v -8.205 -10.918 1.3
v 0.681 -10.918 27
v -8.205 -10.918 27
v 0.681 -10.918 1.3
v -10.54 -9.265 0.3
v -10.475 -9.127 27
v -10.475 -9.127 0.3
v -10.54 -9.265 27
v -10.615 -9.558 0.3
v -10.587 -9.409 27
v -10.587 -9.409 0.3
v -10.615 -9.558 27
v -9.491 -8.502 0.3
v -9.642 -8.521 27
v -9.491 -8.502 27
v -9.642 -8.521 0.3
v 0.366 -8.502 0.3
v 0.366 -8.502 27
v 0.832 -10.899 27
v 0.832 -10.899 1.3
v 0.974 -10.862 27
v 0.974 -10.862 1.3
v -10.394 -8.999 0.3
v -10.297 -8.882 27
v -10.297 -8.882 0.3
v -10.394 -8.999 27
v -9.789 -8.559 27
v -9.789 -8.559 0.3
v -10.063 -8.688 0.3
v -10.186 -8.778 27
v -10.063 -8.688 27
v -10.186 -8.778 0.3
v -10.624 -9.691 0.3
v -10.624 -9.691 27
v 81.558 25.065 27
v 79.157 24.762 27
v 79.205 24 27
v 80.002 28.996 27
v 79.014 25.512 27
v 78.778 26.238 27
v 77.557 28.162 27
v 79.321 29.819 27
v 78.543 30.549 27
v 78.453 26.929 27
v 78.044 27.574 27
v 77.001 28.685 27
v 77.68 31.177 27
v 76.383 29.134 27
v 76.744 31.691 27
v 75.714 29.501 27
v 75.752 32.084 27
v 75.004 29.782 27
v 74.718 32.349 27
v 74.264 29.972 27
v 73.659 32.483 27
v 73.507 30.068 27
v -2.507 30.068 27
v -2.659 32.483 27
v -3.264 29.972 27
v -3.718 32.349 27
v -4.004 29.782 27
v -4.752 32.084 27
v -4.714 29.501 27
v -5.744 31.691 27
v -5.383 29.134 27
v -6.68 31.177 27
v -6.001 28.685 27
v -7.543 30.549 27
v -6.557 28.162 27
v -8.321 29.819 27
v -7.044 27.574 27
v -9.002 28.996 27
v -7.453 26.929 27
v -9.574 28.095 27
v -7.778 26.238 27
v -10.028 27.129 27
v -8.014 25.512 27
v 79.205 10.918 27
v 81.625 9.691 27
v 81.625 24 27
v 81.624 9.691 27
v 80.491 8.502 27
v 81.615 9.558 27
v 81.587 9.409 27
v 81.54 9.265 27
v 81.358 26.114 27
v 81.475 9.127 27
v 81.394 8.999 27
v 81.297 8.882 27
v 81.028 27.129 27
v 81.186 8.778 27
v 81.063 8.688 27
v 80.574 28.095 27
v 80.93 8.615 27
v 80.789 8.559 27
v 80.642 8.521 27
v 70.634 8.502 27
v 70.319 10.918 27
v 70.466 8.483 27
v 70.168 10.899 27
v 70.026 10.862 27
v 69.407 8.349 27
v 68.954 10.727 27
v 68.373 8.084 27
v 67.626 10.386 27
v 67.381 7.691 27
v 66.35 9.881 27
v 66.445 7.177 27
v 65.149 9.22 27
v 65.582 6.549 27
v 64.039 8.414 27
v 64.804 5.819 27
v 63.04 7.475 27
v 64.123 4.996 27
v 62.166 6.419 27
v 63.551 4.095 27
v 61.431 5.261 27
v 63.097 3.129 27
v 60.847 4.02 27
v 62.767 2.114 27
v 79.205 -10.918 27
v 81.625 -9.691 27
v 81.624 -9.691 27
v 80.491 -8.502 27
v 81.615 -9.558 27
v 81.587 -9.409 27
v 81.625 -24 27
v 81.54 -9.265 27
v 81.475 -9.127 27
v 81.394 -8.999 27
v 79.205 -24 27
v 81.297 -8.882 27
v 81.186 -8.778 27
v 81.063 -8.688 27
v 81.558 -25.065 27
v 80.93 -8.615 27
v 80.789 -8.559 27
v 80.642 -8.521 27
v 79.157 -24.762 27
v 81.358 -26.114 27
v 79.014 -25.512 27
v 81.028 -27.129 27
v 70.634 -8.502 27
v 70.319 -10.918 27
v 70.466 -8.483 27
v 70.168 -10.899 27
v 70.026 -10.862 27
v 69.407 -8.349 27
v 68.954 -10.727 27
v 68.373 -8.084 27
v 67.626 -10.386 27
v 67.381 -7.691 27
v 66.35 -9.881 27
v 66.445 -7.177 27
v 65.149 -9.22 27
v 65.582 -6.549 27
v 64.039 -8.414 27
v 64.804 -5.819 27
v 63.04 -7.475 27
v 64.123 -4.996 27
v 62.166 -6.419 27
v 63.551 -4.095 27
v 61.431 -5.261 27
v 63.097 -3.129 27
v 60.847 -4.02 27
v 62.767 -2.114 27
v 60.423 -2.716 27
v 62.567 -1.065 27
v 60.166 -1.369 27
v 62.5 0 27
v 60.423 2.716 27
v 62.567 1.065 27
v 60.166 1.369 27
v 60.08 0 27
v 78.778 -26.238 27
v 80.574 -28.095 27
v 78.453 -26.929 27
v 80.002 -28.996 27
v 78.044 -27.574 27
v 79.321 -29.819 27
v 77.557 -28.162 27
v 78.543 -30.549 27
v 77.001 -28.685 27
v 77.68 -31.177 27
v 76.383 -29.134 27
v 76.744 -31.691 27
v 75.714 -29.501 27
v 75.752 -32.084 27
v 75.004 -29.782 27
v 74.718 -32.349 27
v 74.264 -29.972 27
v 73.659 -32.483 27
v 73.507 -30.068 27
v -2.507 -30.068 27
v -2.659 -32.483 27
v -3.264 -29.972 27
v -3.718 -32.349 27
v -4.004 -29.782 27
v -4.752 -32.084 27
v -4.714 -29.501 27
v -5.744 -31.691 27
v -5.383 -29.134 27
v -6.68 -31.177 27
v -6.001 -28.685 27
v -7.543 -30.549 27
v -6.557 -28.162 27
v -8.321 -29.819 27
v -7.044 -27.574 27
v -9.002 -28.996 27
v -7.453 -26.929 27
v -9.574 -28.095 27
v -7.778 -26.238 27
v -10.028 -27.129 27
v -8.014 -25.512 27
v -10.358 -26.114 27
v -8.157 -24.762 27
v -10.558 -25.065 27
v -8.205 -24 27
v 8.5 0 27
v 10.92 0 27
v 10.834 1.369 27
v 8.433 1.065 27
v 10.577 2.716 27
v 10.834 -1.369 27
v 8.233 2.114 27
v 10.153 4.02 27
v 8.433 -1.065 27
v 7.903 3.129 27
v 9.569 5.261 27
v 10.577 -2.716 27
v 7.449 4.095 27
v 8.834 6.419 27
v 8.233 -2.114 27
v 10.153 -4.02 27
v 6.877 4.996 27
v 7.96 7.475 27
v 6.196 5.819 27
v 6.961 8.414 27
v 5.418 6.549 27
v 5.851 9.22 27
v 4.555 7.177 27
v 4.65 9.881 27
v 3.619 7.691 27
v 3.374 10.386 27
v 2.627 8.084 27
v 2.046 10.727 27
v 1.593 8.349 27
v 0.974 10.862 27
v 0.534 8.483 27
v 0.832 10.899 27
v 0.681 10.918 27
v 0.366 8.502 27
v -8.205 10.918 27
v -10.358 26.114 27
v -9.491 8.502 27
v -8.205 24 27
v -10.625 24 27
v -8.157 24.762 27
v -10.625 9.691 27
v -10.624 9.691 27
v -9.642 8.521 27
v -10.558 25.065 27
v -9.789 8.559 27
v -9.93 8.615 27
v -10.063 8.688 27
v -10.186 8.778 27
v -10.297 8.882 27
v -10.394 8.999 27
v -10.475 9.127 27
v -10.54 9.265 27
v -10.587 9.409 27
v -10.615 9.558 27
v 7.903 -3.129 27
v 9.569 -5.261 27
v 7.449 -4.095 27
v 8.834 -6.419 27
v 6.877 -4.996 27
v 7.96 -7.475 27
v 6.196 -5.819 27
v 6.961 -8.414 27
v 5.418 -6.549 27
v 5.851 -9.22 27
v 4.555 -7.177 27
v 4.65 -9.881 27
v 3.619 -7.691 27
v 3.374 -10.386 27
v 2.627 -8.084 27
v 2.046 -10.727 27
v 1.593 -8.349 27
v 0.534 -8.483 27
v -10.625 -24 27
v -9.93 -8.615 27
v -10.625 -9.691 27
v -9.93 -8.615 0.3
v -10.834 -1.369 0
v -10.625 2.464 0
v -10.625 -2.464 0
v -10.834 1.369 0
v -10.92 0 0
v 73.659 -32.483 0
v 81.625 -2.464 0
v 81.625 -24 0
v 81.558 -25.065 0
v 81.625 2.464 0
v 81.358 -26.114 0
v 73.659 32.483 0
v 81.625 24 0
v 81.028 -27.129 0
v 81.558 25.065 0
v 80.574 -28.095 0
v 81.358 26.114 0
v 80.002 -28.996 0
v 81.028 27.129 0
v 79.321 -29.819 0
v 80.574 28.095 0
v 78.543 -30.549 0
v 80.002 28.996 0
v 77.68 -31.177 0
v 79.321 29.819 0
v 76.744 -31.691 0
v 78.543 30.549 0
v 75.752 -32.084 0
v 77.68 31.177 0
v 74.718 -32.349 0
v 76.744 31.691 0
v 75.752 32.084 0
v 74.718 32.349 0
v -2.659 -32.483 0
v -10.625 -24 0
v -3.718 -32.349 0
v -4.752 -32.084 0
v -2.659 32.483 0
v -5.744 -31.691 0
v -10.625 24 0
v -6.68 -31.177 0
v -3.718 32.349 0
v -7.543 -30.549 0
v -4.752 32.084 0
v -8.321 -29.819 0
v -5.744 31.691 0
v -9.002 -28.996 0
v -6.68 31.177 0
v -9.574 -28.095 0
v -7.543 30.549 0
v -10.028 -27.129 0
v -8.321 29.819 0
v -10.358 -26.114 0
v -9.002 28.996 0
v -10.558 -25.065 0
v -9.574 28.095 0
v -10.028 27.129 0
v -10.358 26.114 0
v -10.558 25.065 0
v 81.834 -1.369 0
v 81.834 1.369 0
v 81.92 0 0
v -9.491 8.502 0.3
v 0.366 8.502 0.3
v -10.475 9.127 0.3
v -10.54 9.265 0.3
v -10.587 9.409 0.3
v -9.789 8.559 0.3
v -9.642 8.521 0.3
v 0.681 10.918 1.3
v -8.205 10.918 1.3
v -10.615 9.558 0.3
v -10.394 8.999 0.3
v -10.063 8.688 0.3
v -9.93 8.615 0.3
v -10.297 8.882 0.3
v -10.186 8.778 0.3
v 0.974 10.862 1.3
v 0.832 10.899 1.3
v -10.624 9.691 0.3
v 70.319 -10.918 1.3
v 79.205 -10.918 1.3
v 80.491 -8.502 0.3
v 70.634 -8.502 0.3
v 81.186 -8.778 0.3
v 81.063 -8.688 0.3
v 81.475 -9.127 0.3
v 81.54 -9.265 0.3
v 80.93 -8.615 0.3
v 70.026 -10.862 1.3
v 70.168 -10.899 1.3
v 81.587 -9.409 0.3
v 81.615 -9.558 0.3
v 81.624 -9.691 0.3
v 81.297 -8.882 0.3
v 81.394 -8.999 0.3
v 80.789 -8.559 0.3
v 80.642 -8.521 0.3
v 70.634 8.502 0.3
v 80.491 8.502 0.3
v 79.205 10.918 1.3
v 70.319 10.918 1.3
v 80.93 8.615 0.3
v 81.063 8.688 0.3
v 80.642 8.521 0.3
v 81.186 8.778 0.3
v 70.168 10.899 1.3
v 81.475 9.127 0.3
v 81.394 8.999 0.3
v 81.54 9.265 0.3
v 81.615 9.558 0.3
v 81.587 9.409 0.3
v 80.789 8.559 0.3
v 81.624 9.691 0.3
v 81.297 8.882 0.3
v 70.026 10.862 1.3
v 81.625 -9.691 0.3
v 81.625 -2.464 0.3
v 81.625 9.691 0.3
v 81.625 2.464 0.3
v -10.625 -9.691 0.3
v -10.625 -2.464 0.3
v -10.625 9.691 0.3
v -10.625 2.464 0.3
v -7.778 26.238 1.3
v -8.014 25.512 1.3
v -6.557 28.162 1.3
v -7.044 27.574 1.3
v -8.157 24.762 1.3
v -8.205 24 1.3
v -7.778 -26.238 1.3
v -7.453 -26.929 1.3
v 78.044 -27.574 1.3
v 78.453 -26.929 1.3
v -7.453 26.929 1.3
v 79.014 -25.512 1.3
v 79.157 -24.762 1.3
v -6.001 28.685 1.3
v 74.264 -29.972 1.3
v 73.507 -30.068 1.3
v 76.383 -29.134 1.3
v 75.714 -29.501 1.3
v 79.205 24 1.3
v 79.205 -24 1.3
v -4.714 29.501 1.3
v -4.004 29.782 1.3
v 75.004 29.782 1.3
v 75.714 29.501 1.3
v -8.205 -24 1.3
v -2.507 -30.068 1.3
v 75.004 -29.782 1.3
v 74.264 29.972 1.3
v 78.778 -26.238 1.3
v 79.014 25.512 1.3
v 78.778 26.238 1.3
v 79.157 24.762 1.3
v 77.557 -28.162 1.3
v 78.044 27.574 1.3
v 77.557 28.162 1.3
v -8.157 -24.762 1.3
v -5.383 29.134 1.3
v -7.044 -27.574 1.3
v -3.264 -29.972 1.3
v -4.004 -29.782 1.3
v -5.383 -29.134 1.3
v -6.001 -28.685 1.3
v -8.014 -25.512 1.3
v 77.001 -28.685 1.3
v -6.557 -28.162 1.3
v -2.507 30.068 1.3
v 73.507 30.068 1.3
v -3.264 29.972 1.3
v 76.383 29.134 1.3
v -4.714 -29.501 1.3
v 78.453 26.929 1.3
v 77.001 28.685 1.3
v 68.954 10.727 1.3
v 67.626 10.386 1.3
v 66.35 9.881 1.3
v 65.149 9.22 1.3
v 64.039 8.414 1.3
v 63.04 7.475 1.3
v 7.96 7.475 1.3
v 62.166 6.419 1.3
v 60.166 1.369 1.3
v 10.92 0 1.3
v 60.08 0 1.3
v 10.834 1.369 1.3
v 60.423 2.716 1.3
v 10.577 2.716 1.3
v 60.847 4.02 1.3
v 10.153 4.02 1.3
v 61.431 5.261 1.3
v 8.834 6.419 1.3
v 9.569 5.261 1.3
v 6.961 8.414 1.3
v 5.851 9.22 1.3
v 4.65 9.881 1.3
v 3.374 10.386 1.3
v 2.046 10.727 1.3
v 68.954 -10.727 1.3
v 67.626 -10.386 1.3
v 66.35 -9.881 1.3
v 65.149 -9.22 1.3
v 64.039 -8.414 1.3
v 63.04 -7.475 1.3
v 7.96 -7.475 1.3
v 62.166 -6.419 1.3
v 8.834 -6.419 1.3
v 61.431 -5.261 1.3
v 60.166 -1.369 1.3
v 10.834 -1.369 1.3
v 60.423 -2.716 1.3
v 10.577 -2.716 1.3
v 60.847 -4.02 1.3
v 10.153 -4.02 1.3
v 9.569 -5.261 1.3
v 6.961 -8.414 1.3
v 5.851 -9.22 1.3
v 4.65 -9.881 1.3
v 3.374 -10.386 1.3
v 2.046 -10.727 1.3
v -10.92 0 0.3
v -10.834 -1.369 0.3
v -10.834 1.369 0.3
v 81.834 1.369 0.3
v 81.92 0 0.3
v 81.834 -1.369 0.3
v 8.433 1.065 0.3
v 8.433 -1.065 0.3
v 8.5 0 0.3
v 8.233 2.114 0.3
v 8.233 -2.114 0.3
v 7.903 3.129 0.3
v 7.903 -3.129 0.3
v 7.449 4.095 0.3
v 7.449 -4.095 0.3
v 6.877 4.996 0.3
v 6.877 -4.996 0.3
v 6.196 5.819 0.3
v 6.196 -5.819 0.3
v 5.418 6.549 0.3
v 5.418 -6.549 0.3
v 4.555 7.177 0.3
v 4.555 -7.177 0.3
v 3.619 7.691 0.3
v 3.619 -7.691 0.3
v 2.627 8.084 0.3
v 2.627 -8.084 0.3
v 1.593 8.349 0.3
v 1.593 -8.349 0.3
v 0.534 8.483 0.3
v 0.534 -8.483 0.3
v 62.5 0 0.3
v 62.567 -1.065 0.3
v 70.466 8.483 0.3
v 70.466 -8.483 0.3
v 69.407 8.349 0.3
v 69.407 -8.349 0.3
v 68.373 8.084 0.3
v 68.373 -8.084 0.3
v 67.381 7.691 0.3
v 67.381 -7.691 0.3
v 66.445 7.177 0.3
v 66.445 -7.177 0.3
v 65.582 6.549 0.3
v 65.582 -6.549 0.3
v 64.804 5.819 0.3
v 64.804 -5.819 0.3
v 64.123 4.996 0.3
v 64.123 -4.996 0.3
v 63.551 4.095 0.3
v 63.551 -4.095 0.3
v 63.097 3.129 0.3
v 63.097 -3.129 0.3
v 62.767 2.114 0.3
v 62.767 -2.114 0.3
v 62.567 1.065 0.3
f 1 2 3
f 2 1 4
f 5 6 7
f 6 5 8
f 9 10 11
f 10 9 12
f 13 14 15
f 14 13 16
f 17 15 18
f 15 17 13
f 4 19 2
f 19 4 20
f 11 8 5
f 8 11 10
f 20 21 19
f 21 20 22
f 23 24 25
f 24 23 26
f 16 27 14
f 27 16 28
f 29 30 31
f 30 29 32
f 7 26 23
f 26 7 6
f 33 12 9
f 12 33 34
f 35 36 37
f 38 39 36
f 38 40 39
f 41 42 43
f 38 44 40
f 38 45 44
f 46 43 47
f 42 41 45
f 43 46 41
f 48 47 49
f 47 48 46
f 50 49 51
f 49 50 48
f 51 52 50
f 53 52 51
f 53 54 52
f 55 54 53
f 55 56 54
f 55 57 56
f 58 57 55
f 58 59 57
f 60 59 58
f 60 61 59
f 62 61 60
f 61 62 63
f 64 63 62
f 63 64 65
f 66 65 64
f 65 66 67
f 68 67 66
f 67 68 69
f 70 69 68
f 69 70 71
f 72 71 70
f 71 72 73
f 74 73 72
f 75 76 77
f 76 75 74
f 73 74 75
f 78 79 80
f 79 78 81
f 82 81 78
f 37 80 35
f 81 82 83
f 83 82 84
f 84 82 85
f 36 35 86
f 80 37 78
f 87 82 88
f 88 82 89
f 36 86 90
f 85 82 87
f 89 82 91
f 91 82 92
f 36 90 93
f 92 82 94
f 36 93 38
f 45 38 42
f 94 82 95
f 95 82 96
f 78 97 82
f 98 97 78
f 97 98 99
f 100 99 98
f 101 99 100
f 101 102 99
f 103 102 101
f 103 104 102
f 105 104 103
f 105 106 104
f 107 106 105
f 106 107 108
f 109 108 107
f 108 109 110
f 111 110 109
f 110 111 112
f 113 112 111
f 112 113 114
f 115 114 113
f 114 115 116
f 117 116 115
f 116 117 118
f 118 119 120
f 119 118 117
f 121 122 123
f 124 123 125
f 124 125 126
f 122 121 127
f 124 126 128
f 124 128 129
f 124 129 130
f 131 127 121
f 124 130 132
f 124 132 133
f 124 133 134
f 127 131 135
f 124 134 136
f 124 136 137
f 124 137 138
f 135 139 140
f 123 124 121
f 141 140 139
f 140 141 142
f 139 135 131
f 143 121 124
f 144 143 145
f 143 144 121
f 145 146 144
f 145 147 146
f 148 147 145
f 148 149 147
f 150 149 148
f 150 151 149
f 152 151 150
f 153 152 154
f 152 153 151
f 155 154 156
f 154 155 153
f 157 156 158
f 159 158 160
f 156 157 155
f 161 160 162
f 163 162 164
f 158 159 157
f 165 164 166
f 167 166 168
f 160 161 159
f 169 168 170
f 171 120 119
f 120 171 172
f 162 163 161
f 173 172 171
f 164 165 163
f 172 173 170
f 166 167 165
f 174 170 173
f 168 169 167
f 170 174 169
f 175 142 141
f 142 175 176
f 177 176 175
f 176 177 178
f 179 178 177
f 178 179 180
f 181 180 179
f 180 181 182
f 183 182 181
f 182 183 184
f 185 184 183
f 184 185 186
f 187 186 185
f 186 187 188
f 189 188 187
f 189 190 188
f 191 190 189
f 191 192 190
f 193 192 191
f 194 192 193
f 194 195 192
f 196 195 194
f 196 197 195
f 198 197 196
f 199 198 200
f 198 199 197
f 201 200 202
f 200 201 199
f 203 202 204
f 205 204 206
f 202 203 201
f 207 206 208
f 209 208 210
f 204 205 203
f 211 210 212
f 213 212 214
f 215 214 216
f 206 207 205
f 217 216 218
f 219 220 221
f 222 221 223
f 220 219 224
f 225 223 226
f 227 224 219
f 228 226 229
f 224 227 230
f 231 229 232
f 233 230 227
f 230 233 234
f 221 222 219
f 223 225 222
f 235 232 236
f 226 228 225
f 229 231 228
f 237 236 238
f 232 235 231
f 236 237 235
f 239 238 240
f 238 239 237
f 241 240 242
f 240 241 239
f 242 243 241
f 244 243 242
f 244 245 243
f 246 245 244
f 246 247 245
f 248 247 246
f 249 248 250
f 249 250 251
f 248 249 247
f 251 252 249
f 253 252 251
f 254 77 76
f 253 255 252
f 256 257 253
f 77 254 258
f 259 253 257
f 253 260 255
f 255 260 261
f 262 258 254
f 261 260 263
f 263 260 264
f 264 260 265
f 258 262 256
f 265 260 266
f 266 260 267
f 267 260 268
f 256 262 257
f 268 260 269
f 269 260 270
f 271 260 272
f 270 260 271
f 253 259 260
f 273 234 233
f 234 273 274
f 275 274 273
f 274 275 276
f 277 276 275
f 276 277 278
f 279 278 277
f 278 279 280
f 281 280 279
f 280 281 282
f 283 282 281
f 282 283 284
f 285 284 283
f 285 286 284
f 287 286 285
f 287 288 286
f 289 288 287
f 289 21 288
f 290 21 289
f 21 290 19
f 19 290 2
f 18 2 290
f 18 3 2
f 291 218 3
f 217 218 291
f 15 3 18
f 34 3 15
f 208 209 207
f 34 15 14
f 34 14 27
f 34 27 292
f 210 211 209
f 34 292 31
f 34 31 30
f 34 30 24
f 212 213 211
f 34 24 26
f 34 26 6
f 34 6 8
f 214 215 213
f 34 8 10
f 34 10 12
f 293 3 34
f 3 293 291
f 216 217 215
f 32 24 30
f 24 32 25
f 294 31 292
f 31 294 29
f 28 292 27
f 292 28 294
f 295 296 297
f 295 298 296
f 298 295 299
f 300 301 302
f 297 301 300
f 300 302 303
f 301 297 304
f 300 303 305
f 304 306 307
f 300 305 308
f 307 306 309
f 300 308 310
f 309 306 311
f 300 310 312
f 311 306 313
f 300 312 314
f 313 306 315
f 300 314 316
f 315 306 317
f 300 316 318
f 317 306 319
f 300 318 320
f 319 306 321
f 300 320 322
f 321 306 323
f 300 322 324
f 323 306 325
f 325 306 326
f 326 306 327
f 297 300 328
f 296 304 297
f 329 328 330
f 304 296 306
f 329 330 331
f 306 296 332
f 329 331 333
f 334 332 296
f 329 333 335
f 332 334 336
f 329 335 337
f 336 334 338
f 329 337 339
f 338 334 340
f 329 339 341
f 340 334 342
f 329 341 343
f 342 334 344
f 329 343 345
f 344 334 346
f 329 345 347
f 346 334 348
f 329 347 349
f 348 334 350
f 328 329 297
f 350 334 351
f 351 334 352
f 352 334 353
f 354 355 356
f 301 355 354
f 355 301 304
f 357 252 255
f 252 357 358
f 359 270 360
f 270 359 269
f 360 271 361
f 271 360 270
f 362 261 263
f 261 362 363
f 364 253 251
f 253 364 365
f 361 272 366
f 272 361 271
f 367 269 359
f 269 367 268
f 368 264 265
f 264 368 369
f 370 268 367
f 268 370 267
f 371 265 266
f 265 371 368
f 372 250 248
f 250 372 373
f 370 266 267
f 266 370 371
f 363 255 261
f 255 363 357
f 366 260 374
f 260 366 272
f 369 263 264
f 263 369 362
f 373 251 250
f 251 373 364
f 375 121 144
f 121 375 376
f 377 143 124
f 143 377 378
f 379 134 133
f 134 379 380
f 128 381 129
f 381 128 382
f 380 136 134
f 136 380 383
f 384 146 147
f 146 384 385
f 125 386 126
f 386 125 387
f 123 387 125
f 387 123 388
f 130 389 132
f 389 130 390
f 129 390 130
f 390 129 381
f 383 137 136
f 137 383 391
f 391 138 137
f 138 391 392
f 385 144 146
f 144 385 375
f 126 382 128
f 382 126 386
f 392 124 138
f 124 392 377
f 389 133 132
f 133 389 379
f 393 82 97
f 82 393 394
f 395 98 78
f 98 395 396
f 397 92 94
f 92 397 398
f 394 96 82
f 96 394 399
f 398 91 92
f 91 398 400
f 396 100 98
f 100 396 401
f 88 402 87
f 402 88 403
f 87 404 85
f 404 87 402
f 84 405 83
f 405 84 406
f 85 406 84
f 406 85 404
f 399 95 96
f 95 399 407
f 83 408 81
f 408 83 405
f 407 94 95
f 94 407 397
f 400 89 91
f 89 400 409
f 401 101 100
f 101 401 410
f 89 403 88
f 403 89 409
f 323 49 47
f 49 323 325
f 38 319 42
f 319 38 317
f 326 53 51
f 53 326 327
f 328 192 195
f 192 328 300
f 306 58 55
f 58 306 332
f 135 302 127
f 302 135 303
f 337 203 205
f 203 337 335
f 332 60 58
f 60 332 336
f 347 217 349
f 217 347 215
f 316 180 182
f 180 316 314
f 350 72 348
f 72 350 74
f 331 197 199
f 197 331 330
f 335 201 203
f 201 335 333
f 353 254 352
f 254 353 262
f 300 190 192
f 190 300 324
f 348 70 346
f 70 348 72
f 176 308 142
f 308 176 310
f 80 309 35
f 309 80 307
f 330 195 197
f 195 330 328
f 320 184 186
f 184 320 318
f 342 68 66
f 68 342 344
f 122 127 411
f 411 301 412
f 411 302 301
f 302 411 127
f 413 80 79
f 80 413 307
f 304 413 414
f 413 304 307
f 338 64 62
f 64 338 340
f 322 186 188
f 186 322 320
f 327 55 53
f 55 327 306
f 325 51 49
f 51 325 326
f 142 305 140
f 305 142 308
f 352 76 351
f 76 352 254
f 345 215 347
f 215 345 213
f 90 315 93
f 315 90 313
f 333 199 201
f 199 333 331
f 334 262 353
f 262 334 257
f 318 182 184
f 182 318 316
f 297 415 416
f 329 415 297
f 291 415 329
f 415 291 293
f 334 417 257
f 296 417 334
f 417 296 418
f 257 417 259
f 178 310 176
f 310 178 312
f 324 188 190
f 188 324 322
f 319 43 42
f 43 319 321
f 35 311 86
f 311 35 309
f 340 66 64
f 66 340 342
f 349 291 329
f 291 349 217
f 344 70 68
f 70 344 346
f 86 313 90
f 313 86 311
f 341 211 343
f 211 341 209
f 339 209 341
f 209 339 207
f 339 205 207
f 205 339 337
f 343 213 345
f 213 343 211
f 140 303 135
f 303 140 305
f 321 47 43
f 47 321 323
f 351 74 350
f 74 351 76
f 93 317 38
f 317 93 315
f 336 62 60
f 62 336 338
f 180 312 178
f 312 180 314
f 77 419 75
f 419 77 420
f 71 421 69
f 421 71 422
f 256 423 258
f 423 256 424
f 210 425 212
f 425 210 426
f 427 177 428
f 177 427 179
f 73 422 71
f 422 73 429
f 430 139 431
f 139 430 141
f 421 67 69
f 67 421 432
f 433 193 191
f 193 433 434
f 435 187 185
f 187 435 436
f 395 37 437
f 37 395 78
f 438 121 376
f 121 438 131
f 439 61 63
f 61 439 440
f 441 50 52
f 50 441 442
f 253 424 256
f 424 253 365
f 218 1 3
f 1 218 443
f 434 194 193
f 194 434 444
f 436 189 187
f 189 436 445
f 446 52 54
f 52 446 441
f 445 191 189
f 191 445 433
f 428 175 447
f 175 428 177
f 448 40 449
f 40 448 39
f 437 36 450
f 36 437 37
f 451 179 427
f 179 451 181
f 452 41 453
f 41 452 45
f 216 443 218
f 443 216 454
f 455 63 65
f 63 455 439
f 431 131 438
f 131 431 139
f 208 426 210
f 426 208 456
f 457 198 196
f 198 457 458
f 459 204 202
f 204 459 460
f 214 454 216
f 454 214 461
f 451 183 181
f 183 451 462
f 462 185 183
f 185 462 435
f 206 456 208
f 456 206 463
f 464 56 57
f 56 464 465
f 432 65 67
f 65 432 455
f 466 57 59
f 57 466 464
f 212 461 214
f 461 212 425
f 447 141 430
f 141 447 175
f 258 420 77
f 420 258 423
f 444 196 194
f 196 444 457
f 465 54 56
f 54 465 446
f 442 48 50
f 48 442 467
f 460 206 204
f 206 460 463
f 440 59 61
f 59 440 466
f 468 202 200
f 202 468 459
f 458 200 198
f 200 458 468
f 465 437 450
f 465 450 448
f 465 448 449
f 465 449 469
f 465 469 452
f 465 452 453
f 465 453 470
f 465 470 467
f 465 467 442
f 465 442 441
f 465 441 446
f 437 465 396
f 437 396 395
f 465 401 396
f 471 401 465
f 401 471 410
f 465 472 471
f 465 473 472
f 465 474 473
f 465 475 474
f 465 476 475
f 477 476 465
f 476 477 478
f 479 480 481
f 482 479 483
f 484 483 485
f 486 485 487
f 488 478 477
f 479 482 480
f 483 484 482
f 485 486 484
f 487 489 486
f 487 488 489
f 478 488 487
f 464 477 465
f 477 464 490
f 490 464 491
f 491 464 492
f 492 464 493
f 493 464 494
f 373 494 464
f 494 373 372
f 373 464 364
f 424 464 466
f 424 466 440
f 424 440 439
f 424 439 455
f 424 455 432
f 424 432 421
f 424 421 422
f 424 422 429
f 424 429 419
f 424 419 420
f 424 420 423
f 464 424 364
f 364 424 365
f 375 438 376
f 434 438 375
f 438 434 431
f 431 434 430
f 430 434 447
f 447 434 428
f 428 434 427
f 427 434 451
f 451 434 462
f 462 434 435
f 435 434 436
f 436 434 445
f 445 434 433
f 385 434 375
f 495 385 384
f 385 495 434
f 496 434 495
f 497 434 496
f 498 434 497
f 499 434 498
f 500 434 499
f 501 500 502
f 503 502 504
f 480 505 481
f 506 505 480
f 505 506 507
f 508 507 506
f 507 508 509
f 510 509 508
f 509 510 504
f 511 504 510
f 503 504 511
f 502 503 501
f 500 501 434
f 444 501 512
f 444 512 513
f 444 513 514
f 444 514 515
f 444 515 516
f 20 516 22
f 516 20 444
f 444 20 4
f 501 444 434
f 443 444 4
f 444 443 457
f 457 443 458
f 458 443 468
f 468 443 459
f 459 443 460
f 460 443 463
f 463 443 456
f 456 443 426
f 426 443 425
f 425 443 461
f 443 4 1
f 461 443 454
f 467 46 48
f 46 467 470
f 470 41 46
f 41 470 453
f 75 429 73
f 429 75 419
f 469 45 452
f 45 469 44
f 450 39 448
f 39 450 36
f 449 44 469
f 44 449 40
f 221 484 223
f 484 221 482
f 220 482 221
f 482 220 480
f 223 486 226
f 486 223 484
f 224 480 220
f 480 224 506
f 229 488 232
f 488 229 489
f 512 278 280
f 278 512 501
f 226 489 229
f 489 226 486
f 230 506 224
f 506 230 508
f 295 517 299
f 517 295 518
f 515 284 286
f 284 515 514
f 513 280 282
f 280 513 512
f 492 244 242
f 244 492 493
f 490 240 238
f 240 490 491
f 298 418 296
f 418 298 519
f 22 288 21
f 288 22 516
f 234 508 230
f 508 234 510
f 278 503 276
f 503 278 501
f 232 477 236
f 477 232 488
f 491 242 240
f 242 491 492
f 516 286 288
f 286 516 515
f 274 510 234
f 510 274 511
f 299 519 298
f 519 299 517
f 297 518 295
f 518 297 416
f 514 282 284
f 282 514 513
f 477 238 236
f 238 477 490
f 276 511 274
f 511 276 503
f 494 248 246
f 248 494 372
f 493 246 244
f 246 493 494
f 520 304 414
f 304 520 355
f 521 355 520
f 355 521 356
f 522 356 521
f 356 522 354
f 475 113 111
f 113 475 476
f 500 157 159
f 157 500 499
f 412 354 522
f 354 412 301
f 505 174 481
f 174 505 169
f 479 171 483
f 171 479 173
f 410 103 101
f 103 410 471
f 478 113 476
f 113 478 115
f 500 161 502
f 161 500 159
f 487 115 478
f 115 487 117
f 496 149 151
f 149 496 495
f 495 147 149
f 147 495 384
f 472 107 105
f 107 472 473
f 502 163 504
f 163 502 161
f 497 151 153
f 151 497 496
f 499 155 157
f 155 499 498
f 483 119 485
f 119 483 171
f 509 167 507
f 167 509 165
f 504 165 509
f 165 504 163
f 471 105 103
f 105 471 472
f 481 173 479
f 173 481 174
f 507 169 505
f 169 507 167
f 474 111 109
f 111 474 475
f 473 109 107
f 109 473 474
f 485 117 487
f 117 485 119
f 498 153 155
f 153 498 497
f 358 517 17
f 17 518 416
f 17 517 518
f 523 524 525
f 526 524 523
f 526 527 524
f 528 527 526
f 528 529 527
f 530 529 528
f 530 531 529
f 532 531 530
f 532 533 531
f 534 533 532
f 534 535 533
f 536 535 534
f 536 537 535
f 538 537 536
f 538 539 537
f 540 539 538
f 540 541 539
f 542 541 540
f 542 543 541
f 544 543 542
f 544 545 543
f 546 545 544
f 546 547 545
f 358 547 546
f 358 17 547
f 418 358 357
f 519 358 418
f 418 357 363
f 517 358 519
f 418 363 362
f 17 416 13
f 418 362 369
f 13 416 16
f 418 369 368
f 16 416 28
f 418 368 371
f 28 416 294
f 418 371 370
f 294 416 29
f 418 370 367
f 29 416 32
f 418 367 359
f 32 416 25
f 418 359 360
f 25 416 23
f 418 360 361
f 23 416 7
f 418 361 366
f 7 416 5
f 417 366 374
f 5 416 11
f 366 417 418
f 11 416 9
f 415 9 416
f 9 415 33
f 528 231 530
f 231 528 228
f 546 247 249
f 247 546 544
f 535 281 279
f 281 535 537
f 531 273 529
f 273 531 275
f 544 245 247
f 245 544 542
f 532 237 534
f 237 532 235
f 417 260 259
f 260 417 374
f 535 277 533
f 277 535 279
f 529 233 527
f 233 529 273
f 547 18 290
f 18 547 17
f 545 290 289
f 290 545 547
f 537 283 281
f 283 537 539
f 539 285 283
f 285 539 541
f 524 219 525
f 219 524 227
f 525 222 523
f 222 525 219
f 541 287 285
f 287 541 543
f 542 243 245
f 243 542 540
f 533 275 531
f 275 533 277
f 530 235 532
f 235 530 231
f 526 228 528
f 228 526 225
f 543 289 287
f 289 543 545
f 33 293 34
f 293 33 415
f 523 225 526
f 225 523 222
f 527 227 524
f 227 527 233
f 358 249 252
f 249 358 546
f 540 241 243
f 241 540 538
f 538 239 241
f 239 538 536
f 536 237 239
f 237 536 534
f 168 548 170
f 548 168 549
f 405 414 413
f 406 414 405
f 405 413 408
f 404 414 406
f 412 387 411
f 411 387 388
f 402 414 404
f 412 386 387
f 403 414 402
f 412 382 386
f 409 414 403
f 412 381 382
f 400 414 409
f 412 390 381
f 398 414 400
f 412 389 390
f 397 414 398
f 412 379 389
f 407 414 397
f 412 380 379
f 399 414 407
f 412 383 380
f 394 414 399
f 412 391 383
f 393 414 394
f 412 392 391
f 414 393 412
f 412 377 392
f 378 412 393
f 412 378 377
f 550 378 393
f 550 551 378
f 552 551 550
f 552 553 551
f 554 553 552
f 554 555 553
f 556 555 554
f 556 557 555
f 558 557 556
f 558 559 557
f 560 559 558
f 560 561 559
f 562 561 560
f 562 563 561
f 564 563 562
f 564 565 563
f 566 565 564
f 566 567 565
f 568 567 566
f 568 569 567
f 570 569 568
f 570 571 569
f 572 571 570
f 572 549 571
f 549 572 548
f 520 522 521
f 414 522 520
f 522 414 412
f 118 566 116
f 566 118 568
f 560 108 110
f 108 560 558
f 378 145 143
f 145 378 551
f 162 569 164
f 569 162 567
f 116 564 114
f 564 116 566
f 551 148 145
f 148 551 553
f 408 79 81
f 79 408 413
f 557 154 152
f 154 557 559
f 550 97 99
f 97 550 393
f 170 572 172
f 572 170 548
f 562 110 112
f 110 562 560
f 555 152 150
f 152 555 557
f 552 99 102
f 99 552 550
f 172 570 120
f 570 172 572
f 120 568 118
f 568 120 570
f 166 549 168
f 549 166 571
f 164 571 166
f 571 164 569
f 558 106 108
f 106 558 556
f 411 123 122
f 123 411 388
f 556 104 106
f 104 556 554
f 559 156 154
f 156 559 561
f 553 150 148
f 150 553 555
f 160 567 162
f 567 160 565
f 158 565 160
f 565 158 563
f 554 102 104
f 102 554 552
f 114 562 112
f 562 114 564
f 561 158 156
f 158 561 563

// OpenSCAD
// Written by Remi Vansnickt <>
//Feel free to tip me : https://www.thingiverse.com/Remivans/about
//Thingiverse : https://www.thingiverse.com/thing:3273050
//Licensed under the Creative Commons - Attribution - Non-Commercial - Share Alike license.

/* [Children bed parameter] */

//(mm)bar diameter
barDiameter=17;//[5:0.1:50]

//(mm) space beetween inner bar
barSpace=54;//[10:0.1:200]

//(mm) Height of output part ( barSpace/2 for uniforme top )
partHeight=27;//[5:0.5:200]

//(mm) Width of output part
partWidth=65;//[5:0.5:200]

//(mm) Height of bottom
floorHeight=1.3;//[0.3:0.1:5]

//(mm) Do you need space beetween part and bar
clearance=0;//[-2:0.1:2]

/* [Printer setting] */
//(mm) Height of first layer ( for removable brim inside hole)
PrinterFirstLayerHeight=0.3;//[0.1:0.01:0.5]

//(mm) Width of your Printer nozzle
PrinterNozzleWidth=0.4;//[0.1:0.05:1]

// number of wall
PartNumberWall=6;//[3:1:20]

cylinderPath=barSpace+barDiameter;
rPath=PrinterNozzleWidth*PartNumberWall/2+0.01;

//output
helper();
output();


//module
module barreau(clearance=0,cut=0){
	translate([0,0,-cut])cylinder(r=barDiameter/2+clearance,h=barSpace/2+2*cut,$fn=50);
	}

module helper(){
	$fn=50;
	hull(){
		translate([-barDiameter/8-barDiameter/2+rPath,-barDiameter/2-rPath-clearance,0])cylinder(r=rPath,h=partHeight);
		translate([+rPath/2,-barDiameter/2-rPath-+clearance,0])cylinder(r=rPath,h=partHeight);
		}
	hull(){
		translate([-barDiameter/8-barDiameter/2+rPath,+barDiameter/2+rPath+clearance,0])cylinder(r=rPath,h=partHeight);
		translate([+rPath/2,+barDiameter/2+rPath+clearance,0])cylinder(r=rPath,h=partHeight);
		}
		
			hull(){
		translate([cylinderPath+barDiameter/8+barDiameter/2-rPath,-barDiameter/2-rPath-+clearance,0])cylinder(r=rPath,h=partHeight);
		translate([-rPath/2+cylinderPath,-barDiameter/2-rPath-+clearance,0])cylinder(r=rPath,h=partHeight);
		}
	hull(){
		translate([cylinderPath+barDiameter/8+barDiameter/2-rPath,+barDiameter/2+rPath+clearance,0])cylinder(r=rPath,h=partHeight);
		translate([-rPath/2+cylinderPath,+barDiameter/2+rPath+clearance,0])cylinder(r=rPath,h=partHeight);
		}
	}

module output(){
	difference(){
		union(){
			//barreau
				translate([0,0,0])barreau(2*rPath+clearance,0);
				translate([cylinderPath,0,0])barreau(2*rPath+clearance,0);
		difference(){

				//cup
			scale([1,1,2*partHeight/barSpace])
			hull(){
				translate([-barDiameter/8,partWidth/2-barDiameter/2,0])barreau(0,0);
				translate([-barDiameter/8,-partWidth/2+barDiameter/2,0])barreau(0,0);
				
				translate([cylinderPath+barDiameter/8,partWidth/2-barDiameter/2,0])barreau(0,0);
				translate([cylinderPath+barDiameter/8,-partWidth/2+barDiameter/2,0])barreau(0,0);
				}	
			
			hull(){
				translate([-barDiameter/8,partWidth/2-barDiameter/2,floorHeight])scale([1,1,2*partHeight/barSpace])barreau(-2*rPath,0);
				translate([-barDiameter/8,-partWidth/2+barDiameter/2,floorHeight])scale([1,1,2*partHeight/barSpace])barreau(-2*rPath,0);
				
				translate([cylinderPath+barDiameter/8,partWidth/2-barDiameter/2,floorHeight])scale([1,1,2*partHeight/barSpace])barreau(-2*rPath,0);
				translate([cylinderPath+barDiameter/8,-partWidth/2+barDiameter/2,floorHeight])scale([1,1,2*partHeight/barSpace])barreau(-2*rPath,0);
				}
			
		}	
		}
		union(){
			//cut barreau
			scale([1,1,2*partHeight/barSpace])
			hull(){
				translate([0,0,0.3])barreau(clearance,0);
				translate([-barDiameter/8-barDiameter/2,0,0.3])barreau(rPath,0);
				}
			scale([1,1,2*partHeight/barSpace])
			hull(){
				translate([cylinderPath+barDiameter/2+barDiameter/8,0,0.3])barreau(rPath,0);
				translate([+cylinderPath,0,0.3])barreau(clearance,0);
				}
		}
	}
		
}
